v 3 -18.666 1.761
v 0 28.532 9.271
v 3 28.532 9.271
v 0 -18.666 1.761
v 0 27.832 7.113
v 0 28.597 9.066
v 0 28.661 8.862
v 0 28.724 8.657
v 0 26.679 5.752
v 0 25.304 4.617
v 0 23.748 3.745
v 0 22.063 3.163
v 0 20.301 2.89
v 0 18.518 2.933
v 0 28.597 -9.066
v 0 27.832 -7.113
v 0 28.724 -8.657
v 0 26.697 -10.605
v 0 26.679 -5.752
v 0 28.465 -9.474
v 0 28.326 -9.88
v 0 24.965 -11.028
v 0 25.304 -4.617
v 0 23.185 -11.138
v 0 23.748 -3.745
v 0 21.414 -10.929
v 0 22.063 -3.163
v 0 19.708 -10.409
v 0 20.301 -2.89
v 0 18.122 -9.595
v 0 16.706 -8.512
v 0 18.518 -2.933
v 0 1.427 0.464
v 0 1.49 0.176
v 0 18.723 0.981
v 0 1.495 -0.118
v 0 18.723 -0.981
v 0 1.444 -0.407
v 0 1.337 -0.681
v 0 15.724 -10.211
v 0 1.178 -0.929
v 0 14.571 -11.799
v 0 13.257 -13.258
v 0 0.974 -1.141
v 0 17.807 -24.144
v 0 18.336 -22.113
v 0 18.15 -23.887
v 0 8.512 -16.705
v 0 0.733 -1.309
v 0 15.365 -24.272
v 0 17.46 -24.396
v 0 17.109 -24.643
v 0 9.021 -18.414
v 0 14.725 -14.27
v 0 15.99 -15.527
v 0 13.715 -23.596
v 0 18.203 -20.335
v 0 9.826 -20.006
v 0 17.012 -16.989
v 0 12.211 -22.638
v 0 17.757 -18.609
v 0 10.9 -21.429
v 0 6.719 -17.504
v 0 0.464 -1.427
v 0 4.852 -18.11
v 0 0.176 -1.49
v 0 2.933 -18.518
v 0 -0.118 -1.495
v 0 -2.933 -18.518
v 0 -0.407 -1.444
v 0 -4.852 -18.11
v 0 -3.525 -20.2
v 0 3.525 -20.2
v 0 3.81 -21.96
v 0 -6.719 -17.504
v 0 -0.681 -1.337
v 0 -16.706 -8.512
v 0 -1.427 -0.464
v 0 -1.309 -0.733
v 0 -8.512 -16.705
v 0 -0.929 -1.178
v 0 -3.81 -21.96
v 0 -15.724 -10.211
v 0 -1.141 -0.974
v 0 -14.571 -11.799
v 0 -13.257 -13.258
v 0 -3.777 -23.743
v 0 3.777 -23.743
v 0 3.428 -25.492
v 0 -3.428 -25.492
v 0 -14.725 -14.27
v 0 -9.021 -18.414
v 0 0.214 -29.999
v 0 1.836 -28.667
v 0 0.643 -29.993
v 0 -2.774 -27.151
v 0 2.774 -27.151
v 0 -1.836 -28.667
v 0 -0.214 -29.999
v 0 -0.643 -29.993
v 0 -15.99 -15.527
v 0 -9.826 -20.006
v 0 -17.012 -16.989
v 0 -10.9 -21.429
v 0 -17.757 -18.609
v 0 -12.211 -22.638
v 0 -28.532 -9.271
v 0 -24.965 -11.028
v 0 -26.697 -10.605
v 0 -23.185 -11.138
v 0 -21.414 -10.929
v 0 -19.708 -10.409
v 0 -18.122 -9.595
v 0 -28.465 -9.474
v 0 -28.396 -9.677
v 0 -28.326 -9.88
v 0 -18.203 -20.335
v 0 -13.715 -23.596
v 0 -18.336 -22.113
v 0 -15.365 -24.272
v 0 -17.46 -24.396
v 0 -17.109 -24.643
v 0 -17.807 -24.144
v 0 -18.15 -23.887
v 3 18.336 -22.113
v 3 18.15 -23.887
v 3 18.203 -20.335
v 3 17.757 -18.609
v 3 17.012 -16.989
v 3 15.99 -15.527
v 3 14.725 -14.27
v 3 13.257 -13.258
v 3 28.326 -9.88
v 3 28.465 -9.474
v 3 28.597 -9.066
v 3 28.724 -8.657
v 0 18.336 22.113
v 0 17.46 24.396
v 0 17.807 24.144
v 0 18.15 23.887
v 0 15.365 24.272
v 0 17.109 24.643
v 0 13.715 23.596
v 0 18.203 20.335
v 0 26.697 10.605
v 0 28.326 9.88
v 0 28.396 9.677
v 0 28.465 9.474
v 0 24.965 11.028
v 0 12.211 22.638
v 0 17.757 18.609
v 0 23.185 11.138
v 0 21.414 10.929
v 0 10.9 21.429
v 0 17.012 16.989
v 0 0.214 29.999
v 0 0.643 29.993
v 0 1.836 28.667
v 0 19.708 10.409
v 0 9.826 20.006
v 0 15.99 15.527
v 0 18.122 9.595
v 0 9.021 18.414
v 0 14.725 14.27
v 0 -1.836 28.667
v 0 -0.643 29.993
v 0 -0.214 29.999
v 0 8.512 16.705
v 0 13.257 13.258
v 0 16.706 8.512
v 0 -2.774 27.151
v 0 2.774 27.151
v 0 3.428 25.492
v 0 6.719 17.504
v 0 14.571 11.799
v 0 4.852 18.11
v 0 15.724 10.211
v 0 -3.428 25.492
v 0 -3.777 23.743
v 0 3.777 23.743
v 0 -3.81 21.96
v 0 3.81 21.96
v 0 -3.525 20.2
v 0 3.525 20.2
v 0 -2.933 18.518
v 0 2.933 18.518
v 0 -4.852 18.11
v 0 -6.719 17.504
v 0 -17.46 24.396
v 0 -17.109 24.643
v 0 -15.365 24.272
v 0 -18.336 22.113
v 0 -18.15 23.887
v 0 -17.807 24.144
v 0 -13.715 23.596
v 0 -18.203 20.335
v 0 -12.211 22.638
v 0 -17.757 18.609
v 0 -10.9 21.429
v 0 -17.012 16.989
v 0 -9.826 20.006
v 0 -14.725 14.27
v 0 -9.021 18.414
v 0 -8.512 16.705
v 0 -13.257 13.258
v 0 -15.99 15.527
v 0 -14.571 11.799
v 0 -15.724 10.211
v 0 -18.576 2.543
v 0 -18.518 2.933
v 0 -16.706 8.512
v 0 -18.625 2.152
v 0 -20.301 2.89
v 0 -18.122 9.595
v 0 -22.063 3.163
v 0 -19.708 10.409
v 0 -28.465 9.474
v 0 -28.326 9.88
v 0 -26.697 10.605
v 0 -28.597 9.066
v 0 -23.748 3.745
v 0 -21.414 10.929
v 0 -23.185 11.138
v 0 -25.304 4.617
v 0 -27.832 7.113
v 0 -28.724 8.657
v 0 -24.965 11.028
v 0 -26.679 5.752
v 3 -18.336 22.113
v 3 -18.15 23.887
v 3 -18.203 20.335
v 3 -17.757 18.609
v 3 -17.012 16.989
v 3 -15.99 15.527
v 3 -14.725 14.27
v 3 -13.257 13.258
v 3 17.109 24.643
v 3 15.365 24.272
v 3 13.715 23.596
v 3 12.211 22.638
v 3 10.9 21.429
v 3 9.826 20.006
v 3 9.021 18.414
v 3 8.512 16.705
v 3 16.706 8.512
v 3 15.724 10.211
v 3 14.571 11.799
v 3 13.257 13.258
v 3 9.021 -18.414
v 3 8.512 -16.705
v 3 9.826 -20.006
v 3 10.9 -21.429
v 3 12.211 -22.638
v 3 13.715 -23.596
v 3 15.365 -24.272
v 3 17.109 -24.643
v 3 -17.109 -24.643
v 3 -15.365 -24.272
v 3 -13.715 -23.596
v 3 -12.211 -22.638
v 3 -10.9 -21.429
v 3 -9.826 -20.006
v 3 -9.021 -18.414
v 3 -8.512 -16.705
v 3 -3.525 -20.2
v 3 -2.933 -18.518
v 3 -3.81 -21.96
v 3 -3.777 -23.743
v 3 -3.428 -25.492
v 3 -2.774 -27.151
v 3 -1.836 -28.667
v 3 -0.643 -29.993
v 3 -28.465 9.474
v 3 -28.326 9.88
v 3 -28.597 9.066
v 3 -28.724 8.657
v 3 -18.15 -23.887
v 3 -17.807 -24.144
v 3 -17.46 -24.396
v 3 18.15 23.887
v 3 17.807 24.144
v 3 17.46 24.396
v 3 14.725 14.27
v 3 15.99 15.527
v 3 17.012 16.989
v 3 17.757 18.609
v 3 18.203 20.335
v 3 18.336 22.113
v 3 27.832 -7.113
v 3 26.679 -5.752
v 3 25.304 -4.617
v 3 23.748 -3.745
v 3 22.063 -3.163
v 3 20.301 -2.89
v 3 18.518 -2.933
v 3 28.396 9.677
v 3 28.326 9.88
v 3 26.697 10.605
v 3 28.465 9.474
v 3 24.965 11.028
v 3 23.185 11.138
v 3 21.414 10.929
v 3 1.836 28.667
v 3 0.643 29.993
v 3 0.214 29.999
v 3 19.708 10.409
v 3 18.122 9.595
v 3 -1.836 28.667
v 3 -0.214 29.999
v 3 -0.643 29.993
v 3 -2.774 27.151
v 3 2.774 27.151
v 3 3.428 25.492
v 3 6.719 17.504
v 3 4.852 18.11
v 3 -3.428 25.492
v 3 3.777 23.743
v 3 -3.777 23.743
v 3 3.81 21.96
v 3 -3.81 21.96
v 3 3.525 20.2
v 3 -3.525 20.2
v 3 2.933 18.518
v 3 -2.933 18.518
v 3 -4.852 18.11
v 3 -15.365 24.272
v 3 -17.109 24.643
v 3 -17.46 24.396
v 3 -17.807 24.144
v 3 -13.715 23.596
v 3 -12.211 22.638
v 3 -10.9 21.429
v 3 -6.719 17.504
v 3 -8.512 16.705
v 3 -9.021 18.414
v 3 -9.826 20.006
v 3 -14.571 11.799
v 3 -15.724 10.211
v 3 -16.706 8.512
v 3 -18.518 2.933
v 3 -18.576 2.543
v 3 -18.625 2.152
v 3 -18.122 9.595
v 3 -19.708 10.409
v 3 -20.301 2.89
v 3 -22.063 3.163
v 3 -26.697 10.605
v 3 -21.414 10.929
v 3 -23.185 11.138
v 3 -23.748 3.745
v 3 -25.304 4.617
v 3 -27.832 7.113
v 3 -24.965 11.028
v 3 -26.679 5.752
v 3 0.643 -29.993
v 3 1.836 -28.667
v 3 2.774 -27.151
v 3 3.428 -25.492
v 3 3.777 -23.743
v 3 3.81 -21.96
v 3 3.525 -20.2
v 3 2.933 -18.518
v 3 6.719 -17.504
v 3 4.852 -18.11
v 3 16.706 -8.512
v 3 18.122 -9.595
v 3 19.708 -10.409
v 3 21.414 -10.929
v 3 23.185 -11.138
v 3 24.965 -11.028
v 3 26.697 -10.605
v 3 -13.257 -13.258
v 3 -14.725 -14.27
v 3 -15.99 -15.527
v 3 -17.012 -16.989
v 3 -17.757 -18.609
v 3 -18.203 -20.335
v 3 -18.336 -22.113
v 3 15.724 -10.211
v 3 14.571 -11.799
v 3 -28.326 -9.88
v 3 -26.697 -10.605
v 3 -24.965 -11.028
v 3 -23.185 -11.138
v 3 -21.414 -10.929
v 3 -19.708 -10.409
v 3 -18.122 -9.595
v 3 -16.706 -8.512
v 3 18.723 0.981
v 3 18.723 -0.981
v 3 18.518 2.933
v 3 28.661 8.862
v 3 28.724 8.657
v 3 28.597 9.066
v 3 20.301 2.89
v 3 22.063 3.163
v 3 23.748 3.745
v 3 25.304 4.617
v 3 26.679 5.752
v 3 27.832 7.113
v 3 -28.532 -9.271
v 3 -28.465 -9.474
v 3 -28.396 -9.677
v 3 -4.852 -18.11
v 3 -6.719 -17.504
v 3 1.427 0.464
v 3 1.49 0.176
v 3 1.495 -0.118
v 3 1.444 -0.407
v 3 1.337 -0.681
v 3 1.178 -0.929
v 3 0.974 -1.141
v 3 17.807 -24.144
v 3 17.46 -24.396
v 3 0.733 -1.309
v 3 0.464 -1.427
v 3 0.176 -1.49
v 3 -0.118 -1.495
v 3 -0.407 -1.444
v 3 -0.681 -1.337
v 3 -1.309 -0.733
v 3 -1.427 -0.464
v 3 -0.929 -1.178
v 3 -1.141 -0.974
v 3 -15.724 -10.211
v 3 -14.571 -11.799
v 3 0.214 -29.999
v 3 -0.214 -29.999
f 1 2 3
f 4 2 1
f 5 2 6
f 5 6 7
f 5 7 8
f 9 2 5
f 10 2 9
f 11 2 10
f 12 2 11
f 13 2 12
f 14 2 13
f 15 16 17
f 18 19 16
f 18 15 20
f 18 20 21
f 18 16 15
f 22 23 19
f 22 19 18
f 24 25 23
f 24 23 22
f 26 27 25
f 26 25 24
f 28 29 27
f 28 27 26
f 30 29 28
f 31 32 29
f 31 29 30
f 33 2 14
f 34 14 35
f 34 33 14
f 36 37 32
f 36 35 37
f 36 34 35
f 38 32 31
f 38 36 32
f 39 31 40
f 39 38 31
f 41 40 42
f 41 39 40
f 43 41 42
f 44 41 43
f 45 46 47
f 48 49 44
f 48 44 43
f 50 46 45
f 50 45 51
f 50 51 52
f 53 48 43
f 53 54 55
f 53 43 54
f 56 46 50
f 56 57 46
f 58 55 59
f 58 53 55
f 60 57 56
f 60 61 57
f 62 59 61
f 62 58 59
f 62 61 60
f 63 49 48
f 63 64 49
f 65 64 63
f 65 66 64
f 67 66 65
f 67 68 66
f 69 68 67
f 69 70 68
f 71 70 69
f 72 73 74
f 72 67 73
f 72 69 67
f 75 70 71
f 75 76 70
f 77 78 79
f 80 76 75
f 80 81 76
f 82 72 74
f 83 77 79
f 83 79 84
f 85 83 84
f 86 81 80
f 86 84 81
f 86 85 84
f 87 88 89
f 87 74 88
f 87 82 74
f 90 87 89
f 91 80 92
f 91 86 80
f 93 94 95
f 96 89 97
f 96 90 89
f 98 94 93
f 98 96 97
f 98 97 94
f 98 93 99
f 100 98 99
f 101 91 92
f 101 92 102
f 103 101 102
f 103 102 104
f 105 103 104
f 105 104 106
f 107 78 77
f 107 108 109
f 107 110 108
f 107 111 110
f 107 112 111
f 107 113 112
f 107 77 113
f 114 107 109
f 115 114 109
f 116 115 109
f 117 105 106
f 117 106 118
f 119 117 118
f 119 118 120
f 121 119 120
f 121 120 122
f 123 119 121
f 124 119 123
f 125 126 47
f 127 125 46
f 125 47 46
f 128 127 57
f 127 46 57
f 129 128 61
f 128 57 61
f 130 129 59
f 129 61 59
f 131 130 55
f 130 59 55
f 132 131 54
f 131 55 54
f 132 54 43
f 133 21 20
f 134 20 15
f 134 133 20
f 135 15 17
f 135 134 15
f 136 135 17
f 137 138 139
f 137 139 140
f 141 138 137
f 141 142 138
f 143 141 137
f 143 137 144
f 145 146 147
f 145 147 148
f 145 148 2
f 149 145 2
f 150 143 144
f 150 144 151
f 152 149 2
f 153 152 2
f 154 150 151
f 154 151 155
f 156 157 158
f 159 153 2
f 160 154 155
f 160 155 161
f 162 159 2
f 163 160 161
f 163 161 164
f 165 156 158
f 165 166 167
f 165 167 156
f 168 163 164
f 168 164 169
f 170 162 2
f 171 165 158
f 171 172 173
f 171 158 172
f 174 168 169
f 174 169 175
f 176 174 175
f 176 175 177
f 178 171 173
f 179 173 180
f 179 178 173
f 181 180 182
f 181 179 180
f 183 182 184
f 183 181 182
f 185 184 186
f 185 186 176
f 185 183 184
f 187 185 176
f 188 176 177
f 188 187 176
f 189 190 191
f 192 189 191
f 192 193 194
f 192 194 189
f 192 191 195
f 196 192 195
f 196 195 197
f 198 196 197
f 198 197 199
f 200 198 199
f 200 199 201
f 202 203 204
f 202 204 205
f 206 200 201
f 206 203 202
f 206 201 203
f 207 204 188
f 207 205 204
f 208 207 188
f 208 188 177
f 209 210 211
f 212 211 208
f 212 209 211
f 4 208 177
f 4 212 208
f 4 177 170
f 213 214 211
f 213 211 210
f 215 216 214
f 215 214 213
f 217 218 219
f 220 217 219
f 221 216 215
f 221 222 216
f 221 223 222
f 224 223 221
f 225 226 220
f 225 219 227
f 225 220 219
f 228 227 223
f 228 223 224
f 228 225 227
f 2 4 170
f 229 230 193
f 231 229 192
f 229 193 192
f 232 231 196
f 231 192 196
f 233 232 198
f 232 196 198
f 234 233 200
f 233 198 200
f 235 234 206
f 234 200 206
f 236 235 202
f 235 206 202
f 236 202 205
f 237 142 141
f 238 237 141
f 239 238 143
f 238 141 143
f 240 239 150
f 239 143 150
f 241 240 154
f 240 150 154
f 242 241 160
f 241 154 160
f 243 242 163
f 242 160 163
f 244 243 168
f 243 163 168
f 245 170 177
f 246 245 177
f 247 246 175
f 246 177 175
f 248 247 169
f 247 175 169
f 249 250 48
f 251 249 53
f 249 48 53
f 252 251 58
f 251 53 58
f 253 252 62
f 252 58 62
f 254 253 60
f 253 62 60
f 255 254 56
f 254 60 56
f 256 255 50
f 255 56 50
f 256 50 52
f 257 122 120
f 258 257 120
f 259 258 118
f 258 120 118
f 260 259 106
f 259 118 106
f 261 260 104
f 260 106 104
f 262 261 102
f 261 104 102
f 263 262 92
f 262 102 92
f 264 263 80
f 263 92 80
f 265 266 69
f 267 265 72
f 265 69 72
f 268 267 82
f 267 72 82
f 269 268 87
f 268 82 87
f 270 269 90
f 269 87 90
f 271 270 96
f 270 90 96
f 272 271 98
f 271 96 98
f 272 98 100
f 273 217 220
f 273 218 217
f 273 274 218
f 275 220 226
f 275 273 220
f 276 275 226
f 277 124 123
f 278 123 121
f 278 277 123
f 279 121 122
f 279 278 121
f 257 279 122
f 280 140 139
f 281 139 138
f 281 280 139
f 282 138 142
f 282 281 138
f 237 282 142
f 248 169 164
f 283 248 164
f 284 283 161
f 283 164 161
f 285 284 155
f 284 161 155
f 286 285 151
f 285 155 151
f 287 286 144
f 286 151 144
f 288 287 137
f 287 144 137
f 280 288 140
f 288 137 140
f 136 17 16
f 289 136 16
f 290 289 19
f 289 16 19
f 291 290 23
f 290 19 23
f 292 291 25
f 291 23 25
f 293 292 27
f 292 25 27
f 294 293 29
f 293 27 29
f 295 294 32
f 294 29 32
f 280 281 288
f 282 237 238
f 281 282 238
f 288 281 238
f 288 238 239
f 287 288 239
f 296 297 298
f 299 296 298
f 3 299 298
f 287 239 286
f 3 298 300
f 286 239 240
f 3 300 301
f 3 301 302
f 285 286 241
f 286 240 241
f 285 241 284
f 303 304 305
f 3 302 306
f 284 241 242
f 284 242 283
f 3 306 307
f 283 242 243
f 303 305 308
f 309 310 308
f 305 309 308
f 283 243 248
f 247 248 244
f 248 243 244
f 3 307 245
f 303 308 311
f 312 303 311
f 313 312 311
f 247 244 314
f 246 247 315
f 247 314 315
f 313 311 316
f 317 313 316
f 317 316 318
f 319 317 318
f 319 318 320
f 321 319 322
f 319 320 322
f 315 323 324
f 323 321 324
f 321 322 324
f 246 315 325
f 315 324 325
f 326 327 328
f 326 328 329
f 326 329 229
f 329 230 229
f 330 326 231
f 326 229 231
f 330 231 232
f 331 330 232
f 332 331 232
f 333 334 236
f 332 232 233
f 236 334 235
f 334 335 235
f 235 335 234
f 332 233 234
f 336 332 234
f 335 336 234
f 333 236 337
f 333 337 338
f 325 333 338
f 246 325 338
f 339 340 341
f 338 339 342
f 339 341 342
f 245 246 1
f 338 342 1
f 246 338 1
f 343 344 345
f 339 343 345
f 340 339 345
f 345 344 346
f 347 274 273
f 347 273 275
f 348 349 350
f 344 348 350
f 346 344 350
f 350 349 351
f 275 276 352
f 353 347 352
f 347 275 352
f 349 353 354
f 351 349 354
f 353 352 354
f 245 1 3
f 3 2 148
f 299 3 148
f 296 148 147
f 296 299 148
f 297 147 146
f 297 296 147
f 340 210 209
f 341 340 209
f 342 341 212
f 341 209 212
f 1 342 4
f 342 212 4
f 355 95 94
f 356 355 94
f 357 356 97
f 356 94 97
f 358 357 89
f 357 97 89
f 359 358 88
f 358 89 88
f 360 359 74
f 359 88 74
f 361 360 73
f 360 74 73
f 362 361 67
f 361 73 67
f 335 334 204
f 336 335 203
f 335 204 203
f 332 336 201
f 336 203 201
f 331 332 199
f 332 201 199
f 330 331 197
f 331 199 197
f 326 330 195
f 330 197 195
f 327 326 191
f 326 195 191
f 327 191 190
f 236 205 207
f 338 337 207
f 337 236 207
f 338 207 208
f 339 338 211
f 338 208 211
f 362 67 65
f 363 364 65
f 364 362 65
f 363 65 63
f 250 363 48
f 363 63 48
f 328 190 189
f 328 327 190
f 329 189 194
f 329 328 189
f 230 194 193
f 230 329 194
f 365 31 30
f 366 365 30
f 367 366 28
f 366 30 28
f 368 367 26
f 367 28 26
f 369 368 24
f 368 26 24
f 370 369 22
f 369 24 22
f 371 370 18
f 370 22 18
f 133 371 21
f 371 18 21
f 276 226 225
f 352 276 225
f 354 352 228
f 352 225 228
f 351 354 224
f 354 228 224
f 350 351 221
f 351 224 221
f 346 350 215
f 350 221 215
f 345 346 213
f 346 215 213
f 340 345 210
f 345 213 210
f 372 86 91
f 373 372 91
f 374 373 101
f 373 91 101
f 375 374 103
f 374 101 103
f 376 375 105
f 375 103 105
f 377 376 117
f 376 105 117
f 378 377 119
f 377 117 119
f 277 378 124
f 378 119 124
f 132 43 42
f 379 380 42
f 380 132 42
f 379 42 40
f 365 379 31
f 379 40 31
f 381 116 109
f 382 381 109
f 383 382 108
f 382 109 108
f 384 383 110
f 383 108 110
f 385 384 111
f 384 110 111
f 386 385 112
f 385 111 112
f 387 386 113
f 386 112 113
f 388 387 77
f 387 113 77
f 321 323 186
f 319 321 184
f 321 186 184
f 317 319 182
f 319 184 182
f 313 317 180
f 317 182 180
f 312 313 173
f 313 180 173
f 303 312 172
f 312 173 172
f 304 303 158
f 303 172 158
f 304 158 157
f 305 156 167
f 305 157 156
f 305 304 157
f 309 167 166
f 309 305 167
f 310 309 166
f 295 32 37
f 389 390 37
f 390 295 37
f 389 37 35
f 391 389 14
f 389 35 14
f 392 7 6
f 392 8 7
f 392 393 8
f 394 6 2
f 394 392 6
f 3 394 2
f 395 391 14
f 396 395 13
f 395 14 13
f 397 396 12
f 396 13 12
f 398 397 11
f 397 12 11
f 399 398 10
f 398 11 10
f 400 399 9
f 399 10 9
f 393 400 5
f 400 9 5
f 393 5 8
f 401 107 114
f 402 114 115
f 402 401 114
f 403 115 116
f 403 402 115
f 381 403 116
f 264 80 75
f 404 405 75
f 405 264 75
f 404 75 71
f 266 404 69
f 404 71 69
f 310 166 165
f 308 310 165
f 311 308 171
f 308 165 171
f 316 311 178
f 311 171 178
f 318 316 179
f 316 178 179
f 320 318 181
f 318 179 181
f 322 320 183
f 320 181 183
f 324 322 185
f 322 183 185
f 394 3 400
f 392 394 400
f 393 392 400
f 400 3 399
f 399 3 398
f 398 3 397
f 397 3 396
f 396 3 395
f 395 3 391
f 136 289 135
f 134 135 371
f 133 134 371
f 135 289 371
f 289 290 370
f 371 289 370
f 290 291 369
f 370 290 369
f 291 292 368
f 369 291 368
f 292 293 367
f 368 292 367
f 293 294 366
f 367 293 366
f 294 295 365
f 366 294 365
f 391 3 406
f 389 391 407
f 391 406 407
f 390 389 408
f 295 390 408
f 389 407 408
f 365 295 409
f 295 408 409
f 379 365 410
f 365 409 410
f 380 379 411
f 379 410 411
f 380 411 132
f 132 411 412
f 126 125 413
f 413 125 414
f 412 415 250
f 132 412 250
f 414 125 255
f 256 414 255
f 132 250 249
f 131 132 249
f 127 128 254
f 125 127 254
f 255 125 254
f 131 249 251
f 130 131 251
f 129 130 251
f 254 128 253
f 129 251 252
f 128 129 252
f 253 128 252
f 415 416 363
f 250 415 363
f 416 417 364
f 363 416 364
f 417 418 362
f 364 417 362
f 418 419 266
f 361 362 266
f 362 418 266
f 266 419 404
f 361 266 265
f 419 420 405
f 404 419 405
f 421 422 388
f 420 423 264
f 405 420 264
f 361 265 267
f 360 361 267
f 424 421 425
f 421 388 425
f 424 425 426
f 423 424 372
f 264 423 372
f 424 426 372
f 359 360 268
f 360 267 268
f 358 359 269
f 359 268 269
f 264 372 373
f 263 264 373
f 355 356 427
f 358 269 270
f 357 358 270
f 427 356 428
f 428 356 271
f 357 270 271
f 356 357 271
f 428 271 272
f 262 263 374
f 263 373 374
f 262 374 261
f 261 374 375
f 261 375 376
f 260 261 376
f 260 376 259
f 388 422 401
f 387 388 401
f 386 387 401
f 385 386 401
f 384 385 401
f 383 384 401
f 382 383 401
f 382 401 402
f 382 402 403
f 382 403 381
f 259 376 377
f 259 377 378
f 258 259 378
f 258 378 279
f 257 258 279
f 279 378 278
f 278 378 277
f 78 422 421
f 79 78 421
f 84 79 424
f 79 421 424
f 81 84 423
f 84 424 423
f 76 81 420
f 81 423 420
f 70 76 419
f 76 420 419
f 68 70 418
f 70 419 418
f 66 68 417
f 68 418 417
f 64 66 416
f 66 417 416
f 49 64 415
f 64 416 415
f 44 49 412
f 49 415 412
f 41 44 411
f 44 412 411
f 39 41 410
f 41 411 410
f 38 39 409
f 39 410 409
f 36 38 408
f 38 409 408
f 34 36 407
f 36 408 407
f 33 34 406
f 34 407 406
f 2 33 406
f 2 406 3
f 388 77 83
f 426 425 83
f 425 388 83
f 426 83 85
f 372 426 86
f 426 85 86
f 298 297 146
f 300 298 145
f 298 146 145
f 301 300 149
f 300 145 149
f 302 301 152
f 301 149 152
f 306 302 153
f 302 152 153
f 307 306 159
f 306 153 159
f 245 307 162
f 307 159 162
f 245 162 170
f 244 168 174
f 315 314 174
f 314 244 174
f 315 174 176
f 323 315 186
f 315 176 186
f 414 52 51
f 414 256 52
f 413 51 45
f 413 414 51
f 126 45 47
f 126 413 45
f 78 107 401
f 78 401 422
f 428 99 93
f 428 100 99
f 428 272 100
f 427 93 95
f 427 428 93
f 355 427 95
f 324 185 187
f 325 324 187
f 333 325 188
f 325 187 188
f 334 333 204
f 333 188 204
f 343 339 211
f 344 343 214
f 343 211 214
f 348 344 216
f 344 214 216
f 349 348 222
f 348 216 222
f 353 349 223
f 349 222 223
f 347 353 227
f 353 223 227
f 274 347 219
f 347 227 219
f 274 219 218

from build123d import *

# Parameters (mm, degrees)
BASPROSKE_W        = 3
BASPROSKE_H        = 30
TOOTHCUT_DEPTH     = 43.532340636
TEETHCUTS_COUNT    = 10
TEETHCUTS_ANGLE    = 324
BORSKE_R           = 1.5
BORE_DEPTH         = 50.0000508
CUT_EXTRUDE1_DEPTH = 10


with BuildPart() as part:
    # BasProSke → Base-Revolve (revolve)
    with BuildSketch(Plane(origin=(0, 0, 0), x_dir=(1, 0, 0), z_dir=(0, 1, 0)), mode=Mode.PRIVATE) as base_revolve_sk:
        with Locations((1.5, 15)):
            Rectangle(BASPROSKE_W, BASPROSKE_H)
    revolve(base_revolve_sk.sketch.rotate(Axis((-10, 0, 0), (1, 0, 0)), 180), axis=Axis((-10, 0, 0), (1, 0, 0)))

    # TooCutSke → ToothCut (cut, through all)
    with BuildSketch(Plane(origin=(0, 0, 0), x_dir=(0, 0, -1), z_dir=(1, 0, 0))):
        with BuildLine():
            ThreePointArc((2.93332476, 18.51811564), (0, 18.749), (-2.93332476, 18.51811564))
            ThreePointArc((-2.93332476, 18.51811564), (-4.155816835, 24.562157762), (-8.691330358, 28.739962104))
            ThreePointArc((-8.691330358, 28.739962104), (0, 30.0254), (8.691330358, 28.739962104))
            ThreePointArc((8.691330358, 28.739962104), (4.155816835, 24.562157762), (2.93332476, 18.51811564))
        make_face()
    toothcut = extrude(amount=TOOTHCUT_DEPTH, mode=Mode.SUBTRACT)

    # TeethCuts: ToothCut ×10 about axis
    teethcuts_axis = Axis((-10, 0, 0), (1, 0, 0))
    for i in range(1, TEETHCUTS_COUNT):
        add(toothcut.rotate(teethcuts_axis, i * TEETHCUTS_ANGLE / (TEETHCUTS_COUNT - 1)), mode=Mode.SUBTRACT)

    # BorSke → Bore (cut, symmetric)
    with BuildSketch(Plane(origin=(0, 0, 0), x_dir=(0, 0, -1), z_dir=(1, 0, 0))):
        with Locations(Location((0, 0, 0), (0, 0, 180))):
            Circle(BORSKE_R)
    extrude(amount=BORE_DEPTH, both=True, mode=Mode.SUBTRACT)

    # Sketch1 → Cut-Extrude1 (cut)
    with BuildSketch(Plane.ZY):
        Polygon((-9.270509831, -28.531695489), (9.270509831, 28.531695489), (-1.174030149, -37.108850883), align=None)
    extrude(amount=-CUT_EXTRUDE1_DEPTH, mode=Mode.SUBTRACT)


with BuildPart() as cut_extrude1_piece_1:
    # of the separate pieces the step leaves, piece 1, a body of its own (cut_extrude1_pieces)
    add(part.part.solids().sort_by_distance((0, 28.723914418, -8.656600978))[0])


with BuildPart() as cut_extrude1_piece_2:
    # of the separate pieces the step leaves, piece 2, a body of its own (cut_extrude1_pieces)
    add(part.part.solids().sort_by_distance((0, 28.326357299, 9.880155978))[0])


solid = Compound([cut_extrude1_piece_1.part, cut_extrude1_piece_2.part])
